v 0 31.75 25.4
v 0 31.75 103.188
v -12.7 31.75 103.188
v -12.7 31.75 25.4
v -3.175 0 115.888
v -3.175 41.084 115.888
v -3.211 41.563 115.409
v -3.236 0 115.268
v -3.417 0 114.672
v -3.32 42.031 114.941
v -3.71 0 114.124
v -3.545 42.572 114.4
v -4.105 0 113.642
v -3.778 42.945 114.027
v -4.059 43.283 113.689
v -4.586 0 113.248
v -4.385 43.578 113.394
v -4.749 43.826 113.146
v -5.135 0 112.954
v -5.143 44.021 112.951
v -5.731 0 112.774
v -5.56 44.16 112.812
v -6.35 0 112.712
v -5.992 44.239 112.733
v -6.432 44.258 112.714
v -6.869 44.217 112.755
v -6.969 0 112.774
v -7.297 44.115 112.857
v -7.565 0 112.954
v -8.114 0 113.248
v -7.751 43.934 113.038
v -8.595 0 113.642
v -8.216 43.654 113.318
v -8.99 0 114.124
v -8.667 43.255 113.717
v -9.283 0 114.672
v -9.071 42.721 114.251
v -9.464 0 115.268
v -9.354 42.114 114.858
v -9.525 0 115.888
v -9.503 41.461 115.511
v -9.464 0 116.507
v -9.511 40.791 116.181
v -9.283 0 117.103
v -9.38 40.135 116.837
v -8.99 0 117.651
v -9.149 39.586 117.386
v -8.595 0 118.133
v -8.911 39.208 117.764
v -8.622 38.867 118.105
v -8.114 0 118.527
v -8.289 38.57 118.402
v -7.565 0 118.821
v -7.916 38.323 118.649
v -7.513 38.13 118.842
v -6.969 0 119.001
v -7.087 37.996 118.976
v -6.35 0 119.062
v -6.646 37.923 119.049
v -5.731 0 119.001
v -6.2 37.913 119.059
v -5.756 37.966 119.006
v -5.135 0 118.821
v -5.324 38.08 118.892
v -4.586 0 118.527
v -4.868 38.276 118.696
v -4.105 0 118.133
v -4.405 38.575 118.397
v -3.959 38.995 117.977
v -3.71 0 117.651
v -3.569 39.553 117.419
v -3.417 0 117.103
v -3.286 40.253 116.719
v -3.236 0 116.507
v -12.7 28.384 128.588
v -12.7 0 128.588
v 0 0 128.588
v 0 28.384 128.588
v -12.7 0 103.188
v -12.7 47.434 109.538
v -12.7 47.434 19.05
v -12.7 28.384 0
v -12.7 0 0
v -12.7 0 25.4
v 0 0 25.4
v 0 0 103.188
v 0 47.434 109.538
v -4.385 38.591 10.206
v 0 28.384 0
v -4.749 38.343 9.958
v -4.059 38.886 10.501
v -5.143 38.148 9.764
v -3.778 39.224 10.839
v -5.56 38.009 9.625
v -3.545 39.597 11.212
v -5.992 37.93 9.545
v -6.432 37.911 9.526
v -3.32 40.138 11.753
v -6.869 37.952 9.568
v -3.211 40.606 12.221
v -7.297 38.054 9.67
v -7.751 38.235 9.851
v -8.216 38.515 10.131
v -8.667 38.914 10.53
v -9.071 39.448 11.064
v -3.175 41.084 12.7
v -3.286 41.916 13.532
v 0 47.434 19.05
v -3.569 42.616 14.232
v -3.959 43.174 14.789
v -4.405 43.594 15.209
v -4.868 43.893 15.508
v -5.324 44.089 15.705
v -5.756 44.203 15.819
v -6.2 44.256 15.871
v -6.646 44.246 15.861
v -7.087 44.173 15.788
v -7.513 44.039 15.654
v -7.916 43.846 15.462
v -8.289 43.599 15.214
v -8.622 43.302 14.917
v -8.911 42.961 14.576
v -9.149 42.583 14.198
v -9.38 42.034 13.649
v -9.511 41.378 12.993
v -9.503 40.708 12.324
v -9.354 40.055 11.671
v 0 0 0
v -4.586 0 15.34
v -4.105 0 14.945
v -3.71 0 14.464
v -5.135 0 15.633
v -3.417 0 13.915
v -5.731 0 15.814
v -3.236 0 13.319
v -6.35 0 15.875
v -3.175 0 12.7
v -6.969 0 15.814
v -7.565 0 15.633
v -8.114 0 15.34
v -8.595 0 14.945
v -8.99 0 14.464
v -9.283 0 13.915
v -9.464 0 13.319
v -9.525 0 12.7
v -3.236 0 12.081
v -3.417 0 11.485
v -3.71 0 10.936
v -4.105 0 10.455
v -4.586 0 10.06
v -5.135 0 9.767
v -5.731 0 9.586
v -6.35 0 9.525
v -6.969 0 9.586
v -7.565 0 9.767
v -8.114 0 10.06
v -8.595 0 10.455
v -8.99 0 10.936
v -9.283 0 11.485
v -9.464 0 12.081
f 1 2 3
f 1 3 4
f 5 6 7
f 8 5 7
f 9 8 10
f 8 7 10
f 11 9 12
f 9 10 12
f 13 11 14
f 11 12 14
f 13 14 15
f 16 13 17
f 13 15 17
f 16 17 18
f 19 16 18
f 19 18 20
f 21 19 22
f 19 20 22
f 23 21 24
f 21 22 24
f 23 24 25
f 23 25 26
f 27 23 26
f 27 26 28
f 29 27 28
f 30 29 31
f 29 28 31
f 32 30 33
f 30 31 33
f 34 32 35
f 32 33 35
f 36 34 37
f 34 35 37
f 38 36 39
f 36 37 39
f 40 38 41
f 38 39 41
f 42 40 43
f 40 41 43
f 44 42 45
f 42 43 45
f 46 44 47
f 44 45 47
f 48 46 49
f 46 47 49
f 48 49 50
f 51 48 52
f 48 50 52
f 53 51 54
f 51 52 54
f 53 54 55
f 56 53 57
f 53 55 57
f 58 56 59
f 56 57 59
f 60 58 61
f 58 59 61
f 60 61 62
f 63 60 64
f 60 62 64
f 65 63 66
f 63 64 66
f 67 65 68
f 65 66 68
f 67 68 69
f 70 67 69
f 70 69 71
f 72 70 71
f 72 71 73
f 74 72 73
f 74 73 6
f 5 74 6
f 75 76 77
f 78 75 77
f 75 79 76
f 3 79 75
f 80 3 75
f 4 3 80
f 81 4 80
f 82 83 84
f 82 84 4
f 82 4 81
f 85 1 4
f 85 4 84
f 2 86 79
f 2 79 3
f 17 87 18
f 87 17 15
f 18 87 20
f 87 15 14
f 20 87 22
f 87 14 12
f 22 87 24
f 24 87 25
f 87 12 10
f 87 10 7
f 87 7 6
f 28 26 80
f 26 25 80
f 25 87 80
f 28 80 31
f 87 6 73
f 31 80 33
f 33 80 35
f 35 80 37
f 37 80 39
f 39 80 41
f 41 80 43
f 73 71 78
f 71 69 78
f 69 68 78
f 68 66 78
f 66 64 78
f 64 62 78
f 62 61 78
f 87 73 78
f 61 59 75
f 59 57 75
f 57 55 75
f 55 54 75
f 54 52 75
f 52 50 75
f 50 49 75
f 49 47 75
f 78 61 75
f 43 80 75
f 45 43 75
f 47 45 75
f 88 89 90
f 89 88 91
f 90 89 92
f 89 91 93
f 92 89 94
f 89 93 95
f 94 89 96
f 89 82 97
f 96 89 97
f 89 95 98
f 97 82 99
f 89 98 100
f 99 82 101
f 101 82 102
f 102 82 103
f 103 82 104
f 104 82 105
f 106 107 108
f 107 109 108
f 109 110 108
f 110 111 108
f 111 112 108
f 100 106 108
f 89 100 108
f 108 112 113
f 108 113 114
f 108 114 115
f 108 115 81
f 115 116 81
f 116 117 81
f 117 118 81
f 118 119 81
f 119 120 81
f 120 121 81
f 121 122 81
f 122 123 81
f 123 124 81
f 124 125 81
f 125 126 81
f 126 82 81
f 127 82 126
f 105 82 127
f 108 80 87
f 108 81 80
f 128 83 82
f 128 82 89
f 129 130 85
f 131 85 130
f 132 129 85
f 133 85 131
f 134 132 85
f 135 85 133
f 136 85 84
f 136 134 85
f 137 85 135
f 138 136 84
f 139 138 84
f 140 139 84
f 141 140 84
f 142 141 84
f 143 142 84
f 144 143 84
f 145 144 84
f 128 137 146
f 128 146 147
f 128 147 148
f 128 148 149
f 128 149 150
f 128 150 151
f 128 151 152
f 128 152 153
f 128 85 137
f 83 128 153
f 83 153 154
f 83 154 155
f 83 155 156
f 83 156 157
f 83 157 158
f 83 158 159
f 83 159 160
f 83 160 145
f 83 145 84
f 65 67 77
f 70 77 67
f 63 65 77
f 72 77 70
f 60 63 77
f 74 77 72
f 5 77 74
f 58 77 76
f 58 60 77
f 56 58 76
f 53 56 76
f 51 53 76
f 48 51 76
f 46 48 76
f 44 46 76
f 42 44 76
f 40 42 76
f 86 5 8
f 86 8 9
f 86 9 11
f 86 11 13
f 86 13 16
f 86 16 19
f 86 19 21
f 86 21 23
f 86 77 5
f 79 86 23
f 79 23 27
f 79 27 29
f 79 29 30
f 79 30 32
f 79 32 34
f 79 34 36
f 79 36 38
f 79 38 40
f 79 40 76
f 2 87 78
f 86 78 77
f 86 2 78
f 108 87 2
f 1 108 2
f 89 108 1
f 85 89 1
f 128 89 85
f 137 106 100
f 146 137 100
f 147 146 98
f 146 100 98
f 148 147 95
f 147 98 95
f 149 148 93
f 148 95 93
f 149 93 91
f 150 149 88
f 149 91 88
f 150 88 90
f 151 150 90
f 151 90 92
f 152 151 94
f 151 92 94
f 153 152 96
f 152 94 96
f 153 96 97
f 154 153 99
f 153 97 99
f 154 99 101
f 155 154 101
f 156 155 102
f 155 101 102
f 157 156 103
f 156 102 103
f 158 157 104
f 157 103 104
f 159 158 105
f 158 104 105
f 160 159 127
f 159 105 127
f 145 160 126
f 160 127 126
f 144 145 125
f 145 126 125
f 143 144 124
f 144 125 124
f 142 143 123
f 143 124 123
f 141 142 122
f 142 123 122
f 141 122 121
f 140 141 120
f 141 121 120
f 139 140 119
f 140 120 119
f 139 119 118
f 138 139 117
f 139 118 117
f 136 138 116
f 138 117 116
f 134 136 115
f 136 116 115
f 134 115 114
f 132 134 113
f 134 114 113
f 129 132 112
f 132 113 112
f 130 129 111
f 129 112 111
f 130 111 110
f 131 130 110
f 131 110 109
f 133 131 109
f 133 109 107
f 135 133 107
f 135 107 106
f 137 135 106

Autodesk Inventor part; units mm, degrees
ref_plane "YZ Plane" through (0, 0, 0) normal (1, 0, 0) x (0, 1, 0)
ref_plane "XZ Plane" through (0, 0, 0) normal (0, 1, 0) x (-1, 0, 0)
ref_plane "XY Plane" through (0, 0, 0) normal (0, 0, 1) x (1, 0, 0)
sketch "Sketch1" plane through (0, 0, 0) normal (0, 0, 1) x (1, 0, 0)
  line L0 (0, 0) -> (-12.7, 0)
  line L1 (-12.7, 0) -> (-12.7, 47.4345)
  line L2 (-12.7, 47.4345) -> (0, 47.4345)
  line L3 (0, 47.4345) -> (0, 0)
  dimension "d0" = 12.7
  dimension "d1" = 47.4345
extrude "Extrusion1" add sketch "Sketch1" along normal blind 128.5875
sketch "Sketch2" plane through (0, 0, 0) normal (1, 0, 0) x (0, 0, -1)
  line L0 (-25.4, 0) -> (-103.1875, 0)
  line L1 (-103.1875, 0) -> (-103.1875, 31.75)
  line L2 (-103.1875, 31.75) -> (-25.4, 31.75)
  line L3 (-25.4, 31.75) -> (-25.4, 0)
  line L4 (0, 47.4345) -> (0, 0) projected
  line L5 (-128.5875, 0) -> (-128.5875, 47.4345) projected
  line L6 (0, 0) -> (-128.5875, 0) projected
  dimension "d4" = 25.4
  dimension "d5" = 25.4
  dimension "d6" = 77.7875
  dimension "d7" = 31.75
  dimension "d8" = 0
extrude "Extrusion2" cut sketch "Sketch2" against normal blind 77.7875
sketch "Sketch3" plane through (-12.7, 47.4345, 0) normal (0, 1, 0) x (1, 0, 0)
  circle A0 centre (6.35, -115.8875) radius 3.175
  circle A1 centre (6.35, -12.7) radius 3.175
  line L0 (0, 0) -> (0, -128.5875) projected
  line L1 (12.7, -128.5875) -> (0, -128.5875) projected
  line L2 (0, 0) -> (12.7, 0) projected
  dimension "d11" = 6.35
  dimension "d12" = 6.35
  dimension "d13" = 6.35
  dimension "d14" = 6.35
  dimension "d15" = 12.7
  dimension "d16" = 12.7
extrude "Extrusion3" cut sketch "Sketch3" against normal blind 77.7875
chamfer "Chamfer1" distance 19.05 angle 45 2 edges at (-6.35, 47.4345, 0) (-6.35, 47.4345, 128.5875)
properties part number "Intake Robustifier"
